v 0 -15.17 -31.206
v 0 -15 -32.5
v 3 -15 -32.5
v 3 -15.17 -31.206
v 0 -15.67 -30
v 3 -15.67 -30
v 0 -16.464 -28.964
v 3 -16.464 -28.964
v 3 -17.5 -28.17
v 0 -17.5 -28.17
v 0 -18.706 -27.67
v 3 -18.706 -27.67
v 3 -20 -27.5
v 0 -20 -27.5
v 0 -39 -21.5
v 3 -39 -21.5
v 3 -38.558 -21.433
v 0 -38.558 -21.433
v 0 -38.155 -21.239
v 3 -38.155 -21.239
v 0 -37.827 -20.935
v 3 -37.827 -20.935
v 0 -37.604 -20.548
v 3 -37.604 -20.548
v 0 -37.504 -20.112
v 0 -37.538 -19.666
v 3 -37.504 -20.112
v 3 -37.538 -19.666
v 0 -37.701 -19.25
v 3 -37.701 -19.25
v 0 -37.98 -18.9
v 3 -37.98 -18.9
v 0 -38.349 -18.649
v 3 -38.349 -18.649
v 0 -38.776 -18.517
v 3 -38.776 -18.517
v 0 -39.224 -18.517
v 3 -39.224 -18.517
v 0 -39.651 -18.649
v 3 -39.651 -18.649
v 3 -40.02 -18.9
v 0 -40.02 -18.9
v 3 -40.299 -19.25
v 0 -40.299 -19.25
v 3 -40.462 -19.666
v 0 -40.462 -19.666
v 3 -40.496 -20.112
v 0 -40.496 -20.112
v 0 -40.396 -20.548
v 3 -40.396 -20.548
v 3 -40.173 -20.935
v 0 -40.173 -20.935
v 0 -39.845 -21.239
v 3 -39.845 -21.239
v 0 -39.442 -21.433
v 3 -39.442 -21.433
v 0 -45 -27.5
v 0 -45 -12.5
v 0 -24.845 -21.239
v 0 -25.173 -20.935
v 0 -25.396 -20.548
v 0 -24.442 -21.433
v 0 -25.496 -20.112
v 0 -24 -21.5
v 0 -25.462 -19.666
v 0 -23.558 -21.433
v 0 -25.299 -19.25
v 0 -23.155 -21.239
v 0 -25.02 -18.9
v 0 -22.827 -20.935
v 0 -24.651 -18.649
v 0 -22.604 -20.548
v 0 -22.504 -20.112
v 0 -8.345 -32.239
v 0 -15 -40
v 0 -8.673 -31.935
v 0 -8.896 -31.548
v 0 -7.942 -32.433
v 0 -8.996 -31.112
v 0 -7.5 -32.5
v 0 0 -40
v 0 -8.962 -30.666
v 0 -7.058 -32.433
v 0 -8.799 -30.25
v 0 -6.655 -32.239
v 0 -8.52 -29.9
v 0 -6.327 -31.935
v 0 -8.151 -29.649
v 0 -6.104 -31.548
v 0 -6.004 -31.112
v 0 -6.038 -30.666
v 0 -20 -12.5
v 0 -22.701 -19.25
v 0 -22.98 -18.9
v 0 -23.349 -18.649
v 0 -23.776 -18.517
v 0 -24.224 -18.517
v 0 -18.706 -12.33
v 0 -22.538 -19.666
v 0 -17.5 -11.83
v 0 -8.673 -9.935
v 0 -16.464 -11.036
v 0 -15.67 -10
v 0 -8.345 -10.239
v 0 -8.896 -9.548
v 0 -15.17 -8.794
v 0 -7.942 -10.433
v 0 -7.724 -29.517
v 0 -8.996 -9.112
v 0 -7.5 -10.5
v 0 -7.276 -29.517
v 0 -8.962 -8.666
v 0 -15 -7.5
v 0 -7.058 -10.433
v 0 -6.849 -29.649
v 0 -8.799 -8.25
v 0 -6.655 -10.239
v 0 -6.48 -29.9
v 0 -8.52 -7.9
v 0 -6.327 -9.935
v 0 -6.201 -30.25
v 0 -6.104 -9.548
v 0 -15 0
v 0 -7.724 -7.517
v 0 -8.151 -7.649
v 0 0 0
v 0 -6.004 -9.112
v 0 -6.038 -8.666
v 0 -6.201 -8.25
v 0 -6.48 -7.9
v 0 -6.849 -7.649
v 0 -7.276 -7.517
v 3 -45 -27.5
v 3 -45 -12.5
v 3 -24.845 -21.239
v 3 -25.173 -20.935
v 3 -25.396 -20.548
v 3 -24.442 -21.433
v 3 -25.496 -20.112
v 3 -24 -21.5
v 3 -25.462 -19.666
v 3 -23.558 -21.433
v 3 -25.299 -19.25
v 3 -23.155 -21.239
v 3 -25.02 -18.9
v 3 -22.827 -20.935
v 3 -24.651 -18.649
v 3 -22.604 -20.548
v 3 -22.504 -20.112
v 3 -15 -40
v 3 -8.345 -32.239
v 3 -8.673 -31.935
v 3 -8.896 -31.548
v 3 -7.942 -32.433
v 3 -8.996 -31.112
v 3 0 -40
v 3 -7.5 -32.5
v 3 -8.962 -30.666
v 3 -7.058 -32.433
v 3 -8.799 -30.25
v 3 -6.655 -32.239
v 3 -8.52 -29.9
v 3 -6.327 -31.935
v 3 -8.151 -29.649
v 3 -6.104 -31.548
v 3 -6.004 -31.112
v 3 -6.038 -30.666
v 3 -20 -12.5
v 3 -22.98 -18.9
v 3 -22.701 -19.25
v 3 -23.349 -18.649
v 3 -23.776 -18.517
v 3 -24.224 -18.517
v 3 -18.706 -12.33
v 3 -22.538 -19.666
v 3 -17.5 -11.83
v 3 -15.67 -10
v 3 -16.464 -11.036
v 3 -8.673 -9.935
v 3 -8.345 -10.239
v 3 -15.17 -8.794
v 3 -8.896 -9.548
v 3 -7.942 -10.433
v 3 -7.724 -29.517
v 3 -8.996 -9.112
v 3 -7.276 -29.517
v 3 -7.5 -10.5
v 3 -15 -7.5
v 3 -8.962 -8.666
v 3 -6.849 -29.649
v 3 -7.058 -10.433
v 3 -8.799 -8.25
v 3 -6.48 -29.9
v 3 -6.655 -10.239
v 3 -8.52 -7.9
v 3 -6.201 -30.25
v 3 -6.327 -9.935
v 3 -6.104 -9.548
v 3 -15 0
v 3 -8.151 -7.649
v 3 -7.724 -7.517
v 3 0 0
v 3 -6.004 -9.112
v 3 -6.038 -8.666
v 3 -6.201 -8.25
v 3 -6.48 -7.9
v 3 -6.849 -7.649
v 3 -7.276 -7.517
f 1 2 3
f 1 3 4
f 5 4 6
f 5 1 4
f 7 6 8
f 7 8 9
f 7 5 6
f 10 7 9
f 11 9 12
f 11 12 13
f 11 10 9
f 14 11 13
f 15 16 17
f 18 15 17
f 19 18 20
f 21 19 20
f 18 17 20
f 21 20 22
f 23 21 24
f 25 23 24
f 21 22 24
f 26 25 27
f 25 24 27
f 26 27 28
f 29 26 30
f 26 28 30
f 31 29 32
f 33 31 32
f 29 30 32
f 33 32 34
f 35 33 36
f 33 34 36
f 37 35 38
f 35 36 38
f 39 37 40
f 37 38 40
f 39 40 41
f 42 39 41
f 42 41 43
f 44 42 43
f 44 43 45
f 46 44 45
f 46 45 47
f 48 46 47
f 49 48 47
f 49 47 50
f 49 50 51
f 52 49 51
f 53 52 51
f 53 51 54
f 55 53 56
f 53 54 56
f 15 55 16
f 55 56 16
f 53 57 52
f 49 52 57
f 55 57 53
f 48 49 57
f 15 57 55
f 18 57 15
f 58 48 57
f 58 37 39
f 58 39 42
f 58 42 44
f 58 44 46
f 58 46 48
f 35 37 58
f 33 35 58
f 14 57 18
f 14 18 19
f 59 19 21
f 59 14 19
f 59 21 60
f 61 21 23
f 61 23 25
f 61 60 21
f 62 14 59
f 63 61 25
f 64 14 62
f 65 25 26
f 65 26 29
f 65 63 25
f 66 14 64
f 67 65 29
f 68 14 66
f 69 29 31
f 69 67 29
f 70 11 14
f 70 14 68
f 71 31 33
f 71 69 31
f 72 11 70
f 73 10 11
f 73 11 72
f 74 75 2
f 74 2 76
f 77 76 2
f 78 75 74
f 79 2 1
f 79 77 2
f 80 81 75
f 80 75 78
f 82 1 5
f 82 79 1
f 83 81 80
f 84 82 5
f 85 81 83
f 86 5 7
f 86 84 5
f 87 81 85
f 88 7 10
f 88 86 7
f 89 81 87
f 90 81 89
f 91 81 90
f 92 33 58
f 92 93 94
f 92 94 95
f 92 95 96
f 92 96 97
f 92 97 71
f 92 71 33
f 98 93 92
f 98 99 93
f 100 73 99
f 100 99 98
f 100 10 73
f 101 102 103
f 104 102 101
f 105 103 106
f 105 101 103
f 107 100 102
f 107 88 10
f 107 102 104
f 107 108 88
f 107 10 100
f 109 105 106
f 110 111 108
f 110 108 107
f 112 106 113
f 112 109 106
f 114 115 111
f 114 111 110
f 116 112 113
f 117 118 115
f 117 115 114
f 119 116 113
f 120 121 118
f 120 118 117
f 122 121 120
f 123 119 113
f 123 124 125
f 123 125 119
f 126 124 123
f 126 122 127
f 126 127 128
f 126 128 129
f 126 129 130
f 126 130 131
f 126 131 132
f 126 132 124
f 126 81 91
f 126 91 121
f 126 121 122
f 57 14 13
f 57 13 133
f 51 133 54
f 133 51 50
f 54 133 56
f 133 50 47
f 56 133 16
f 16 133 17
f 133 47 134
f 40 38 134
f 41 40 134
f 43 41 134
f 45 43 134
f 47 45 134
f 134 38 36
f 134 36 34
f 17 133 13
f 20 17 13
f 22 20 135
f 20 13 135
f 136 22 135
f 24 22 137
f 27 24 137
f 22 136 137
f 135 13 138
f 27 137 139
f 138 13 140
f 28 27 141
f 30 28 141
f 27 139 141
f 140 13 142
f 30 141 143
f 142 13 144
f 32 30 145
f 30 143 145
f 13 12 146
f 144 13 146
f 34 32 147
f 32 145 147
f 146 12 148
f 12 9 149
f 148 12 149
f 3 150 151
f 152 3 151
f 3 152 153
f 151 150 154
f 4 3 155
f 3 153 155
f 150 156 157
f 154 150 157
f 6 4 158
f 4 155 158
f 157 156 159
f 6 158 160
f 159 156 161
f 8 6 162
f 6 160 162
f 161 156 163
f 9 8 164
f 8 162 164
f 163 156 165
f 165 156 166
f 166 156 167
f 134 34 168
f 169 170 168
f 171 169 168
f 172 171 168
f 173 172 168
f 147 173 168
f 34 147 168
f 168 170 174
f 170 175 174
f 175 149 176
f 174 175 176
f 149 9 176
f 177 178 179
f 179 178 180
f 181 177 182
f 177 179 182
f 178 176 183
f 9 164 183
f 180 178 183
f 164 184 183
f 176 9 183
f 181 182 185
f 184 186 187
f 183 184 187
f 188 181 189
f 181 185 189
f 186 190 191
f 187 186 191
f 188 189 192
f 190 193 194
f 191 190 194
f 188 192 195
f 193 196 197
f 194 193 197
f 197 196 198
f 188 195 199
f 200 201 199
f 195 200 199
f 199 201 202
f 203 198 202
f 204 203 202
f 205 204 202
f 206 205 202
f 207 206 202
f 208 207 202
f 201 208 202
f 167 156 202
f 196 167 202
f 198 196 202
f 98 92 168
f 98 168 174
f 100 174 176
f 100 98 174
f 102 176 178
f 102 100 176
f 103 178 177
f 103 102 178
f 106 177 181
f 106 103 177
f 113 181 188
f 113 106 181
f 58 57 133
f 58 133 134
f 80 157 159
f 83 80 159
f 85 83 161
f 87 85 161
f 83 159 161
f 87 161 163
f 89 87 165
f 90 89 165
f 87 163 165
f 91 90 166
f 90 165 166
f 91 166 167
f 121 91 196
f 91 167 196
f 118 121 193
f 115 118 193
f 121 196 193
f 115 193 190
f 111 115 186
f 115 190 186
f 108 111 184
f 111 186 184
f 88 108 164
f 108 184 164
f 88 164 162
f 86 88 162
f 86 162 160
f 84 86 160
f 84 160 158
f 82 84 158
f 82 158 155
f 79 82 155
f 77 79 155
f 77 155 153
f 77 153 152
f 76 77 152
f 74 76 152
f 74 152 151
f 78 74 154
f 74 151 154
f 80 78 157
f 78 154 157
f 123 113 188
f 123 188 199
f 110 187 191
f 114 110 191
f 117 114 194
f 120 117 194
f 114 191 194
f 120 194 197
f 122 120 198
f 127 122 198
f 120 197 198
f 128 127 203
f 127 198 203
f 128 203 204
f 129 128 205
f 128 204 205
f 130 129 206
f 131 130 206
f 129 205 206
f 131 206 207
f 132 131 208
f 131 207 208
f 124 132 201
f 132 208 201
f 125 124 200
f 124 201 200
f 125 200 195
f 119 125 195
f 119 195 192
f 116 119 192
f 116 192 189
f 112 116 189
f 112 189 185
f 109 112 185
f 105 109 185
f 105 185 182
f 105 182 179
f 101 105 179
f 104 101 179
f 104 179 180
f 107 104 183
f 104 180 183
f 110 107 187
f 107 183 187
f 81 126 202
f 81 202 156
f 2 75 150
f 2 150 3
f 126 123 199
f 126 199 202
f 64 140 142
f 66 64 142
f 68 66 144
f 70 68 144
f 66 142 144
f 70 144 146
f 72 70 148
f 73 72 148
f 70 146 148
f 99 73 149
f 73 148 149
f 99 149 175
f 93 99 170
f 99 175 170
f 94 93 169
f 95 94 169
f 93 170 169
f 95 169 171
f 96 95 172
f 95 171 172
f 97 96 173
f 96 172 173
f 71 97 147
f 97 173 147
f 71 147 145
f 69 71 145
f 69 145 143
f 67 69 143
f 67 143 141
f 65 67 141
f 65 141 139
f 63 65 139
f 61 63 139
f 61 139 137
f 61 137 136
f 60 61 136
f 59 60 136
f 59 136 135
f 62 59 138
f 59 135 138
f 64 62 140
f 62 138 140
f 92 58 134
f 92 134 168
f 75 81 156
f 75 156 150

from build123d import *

# Parameters (mm, degrees)
EXTRUDE_1_DEPTH     = 3
SKETCH_2_R          = 1.5
CUT_EXTRUDE_1_DEPTH = 3


with BuildPart() as part:
    # 草图1 → 凸台-拉伸1 (new body)
    with BuildSketch(Plane(origin=(0, 0, 0), x_dir=(0, 0, -1), z_dir=(1, 0, 0))):
        with BuildLine():
            Line((0, 0), (40, 0))
            Line((40, 0), (40, -15))
            Line((40, -15), (32.5, -15))
            ThreePointArc((32.5, -15), (28.964466094, -16.464466094), (27.5, -20))
            Line((27.5, -20), (27.5, -45))
            Line((27.5, -45), (12.5, -45))
            Line((12.5, -45), (12.5, -20))
            ThreePointArc((12.5, -20), (11.035533906, -16.464466094), (7.5, -15))
            Line((7.5, -15), (0, -15))
            Line((0, -15), (0, 0))
        make_face()
    extrude(amount=EXTRUDE_1_DEPTH)

    # 草图2 → 切除-拉伸1 (cut)
    with BuildSketch(Plane(origin=(3, 0, 0), x_dir=(0, 0, -1), z_dir=(1, 0, 0))):
        with Locations((31, -7.5)):
            Circle(SKETCH_2_R)
        with Locations((9, -7.5)):
            Circle(SKETCH_2_R)
        with Locations((20, -39)):
            Circle(SKETCH_2_R)
        with Locations((20, -24)):
            Circle(SKETCH_2_R)
    extrude(amount=-CUT_EXTRUDE_1_DEPTH, mode=Mode.SUBTRACT)


solid = part.part
